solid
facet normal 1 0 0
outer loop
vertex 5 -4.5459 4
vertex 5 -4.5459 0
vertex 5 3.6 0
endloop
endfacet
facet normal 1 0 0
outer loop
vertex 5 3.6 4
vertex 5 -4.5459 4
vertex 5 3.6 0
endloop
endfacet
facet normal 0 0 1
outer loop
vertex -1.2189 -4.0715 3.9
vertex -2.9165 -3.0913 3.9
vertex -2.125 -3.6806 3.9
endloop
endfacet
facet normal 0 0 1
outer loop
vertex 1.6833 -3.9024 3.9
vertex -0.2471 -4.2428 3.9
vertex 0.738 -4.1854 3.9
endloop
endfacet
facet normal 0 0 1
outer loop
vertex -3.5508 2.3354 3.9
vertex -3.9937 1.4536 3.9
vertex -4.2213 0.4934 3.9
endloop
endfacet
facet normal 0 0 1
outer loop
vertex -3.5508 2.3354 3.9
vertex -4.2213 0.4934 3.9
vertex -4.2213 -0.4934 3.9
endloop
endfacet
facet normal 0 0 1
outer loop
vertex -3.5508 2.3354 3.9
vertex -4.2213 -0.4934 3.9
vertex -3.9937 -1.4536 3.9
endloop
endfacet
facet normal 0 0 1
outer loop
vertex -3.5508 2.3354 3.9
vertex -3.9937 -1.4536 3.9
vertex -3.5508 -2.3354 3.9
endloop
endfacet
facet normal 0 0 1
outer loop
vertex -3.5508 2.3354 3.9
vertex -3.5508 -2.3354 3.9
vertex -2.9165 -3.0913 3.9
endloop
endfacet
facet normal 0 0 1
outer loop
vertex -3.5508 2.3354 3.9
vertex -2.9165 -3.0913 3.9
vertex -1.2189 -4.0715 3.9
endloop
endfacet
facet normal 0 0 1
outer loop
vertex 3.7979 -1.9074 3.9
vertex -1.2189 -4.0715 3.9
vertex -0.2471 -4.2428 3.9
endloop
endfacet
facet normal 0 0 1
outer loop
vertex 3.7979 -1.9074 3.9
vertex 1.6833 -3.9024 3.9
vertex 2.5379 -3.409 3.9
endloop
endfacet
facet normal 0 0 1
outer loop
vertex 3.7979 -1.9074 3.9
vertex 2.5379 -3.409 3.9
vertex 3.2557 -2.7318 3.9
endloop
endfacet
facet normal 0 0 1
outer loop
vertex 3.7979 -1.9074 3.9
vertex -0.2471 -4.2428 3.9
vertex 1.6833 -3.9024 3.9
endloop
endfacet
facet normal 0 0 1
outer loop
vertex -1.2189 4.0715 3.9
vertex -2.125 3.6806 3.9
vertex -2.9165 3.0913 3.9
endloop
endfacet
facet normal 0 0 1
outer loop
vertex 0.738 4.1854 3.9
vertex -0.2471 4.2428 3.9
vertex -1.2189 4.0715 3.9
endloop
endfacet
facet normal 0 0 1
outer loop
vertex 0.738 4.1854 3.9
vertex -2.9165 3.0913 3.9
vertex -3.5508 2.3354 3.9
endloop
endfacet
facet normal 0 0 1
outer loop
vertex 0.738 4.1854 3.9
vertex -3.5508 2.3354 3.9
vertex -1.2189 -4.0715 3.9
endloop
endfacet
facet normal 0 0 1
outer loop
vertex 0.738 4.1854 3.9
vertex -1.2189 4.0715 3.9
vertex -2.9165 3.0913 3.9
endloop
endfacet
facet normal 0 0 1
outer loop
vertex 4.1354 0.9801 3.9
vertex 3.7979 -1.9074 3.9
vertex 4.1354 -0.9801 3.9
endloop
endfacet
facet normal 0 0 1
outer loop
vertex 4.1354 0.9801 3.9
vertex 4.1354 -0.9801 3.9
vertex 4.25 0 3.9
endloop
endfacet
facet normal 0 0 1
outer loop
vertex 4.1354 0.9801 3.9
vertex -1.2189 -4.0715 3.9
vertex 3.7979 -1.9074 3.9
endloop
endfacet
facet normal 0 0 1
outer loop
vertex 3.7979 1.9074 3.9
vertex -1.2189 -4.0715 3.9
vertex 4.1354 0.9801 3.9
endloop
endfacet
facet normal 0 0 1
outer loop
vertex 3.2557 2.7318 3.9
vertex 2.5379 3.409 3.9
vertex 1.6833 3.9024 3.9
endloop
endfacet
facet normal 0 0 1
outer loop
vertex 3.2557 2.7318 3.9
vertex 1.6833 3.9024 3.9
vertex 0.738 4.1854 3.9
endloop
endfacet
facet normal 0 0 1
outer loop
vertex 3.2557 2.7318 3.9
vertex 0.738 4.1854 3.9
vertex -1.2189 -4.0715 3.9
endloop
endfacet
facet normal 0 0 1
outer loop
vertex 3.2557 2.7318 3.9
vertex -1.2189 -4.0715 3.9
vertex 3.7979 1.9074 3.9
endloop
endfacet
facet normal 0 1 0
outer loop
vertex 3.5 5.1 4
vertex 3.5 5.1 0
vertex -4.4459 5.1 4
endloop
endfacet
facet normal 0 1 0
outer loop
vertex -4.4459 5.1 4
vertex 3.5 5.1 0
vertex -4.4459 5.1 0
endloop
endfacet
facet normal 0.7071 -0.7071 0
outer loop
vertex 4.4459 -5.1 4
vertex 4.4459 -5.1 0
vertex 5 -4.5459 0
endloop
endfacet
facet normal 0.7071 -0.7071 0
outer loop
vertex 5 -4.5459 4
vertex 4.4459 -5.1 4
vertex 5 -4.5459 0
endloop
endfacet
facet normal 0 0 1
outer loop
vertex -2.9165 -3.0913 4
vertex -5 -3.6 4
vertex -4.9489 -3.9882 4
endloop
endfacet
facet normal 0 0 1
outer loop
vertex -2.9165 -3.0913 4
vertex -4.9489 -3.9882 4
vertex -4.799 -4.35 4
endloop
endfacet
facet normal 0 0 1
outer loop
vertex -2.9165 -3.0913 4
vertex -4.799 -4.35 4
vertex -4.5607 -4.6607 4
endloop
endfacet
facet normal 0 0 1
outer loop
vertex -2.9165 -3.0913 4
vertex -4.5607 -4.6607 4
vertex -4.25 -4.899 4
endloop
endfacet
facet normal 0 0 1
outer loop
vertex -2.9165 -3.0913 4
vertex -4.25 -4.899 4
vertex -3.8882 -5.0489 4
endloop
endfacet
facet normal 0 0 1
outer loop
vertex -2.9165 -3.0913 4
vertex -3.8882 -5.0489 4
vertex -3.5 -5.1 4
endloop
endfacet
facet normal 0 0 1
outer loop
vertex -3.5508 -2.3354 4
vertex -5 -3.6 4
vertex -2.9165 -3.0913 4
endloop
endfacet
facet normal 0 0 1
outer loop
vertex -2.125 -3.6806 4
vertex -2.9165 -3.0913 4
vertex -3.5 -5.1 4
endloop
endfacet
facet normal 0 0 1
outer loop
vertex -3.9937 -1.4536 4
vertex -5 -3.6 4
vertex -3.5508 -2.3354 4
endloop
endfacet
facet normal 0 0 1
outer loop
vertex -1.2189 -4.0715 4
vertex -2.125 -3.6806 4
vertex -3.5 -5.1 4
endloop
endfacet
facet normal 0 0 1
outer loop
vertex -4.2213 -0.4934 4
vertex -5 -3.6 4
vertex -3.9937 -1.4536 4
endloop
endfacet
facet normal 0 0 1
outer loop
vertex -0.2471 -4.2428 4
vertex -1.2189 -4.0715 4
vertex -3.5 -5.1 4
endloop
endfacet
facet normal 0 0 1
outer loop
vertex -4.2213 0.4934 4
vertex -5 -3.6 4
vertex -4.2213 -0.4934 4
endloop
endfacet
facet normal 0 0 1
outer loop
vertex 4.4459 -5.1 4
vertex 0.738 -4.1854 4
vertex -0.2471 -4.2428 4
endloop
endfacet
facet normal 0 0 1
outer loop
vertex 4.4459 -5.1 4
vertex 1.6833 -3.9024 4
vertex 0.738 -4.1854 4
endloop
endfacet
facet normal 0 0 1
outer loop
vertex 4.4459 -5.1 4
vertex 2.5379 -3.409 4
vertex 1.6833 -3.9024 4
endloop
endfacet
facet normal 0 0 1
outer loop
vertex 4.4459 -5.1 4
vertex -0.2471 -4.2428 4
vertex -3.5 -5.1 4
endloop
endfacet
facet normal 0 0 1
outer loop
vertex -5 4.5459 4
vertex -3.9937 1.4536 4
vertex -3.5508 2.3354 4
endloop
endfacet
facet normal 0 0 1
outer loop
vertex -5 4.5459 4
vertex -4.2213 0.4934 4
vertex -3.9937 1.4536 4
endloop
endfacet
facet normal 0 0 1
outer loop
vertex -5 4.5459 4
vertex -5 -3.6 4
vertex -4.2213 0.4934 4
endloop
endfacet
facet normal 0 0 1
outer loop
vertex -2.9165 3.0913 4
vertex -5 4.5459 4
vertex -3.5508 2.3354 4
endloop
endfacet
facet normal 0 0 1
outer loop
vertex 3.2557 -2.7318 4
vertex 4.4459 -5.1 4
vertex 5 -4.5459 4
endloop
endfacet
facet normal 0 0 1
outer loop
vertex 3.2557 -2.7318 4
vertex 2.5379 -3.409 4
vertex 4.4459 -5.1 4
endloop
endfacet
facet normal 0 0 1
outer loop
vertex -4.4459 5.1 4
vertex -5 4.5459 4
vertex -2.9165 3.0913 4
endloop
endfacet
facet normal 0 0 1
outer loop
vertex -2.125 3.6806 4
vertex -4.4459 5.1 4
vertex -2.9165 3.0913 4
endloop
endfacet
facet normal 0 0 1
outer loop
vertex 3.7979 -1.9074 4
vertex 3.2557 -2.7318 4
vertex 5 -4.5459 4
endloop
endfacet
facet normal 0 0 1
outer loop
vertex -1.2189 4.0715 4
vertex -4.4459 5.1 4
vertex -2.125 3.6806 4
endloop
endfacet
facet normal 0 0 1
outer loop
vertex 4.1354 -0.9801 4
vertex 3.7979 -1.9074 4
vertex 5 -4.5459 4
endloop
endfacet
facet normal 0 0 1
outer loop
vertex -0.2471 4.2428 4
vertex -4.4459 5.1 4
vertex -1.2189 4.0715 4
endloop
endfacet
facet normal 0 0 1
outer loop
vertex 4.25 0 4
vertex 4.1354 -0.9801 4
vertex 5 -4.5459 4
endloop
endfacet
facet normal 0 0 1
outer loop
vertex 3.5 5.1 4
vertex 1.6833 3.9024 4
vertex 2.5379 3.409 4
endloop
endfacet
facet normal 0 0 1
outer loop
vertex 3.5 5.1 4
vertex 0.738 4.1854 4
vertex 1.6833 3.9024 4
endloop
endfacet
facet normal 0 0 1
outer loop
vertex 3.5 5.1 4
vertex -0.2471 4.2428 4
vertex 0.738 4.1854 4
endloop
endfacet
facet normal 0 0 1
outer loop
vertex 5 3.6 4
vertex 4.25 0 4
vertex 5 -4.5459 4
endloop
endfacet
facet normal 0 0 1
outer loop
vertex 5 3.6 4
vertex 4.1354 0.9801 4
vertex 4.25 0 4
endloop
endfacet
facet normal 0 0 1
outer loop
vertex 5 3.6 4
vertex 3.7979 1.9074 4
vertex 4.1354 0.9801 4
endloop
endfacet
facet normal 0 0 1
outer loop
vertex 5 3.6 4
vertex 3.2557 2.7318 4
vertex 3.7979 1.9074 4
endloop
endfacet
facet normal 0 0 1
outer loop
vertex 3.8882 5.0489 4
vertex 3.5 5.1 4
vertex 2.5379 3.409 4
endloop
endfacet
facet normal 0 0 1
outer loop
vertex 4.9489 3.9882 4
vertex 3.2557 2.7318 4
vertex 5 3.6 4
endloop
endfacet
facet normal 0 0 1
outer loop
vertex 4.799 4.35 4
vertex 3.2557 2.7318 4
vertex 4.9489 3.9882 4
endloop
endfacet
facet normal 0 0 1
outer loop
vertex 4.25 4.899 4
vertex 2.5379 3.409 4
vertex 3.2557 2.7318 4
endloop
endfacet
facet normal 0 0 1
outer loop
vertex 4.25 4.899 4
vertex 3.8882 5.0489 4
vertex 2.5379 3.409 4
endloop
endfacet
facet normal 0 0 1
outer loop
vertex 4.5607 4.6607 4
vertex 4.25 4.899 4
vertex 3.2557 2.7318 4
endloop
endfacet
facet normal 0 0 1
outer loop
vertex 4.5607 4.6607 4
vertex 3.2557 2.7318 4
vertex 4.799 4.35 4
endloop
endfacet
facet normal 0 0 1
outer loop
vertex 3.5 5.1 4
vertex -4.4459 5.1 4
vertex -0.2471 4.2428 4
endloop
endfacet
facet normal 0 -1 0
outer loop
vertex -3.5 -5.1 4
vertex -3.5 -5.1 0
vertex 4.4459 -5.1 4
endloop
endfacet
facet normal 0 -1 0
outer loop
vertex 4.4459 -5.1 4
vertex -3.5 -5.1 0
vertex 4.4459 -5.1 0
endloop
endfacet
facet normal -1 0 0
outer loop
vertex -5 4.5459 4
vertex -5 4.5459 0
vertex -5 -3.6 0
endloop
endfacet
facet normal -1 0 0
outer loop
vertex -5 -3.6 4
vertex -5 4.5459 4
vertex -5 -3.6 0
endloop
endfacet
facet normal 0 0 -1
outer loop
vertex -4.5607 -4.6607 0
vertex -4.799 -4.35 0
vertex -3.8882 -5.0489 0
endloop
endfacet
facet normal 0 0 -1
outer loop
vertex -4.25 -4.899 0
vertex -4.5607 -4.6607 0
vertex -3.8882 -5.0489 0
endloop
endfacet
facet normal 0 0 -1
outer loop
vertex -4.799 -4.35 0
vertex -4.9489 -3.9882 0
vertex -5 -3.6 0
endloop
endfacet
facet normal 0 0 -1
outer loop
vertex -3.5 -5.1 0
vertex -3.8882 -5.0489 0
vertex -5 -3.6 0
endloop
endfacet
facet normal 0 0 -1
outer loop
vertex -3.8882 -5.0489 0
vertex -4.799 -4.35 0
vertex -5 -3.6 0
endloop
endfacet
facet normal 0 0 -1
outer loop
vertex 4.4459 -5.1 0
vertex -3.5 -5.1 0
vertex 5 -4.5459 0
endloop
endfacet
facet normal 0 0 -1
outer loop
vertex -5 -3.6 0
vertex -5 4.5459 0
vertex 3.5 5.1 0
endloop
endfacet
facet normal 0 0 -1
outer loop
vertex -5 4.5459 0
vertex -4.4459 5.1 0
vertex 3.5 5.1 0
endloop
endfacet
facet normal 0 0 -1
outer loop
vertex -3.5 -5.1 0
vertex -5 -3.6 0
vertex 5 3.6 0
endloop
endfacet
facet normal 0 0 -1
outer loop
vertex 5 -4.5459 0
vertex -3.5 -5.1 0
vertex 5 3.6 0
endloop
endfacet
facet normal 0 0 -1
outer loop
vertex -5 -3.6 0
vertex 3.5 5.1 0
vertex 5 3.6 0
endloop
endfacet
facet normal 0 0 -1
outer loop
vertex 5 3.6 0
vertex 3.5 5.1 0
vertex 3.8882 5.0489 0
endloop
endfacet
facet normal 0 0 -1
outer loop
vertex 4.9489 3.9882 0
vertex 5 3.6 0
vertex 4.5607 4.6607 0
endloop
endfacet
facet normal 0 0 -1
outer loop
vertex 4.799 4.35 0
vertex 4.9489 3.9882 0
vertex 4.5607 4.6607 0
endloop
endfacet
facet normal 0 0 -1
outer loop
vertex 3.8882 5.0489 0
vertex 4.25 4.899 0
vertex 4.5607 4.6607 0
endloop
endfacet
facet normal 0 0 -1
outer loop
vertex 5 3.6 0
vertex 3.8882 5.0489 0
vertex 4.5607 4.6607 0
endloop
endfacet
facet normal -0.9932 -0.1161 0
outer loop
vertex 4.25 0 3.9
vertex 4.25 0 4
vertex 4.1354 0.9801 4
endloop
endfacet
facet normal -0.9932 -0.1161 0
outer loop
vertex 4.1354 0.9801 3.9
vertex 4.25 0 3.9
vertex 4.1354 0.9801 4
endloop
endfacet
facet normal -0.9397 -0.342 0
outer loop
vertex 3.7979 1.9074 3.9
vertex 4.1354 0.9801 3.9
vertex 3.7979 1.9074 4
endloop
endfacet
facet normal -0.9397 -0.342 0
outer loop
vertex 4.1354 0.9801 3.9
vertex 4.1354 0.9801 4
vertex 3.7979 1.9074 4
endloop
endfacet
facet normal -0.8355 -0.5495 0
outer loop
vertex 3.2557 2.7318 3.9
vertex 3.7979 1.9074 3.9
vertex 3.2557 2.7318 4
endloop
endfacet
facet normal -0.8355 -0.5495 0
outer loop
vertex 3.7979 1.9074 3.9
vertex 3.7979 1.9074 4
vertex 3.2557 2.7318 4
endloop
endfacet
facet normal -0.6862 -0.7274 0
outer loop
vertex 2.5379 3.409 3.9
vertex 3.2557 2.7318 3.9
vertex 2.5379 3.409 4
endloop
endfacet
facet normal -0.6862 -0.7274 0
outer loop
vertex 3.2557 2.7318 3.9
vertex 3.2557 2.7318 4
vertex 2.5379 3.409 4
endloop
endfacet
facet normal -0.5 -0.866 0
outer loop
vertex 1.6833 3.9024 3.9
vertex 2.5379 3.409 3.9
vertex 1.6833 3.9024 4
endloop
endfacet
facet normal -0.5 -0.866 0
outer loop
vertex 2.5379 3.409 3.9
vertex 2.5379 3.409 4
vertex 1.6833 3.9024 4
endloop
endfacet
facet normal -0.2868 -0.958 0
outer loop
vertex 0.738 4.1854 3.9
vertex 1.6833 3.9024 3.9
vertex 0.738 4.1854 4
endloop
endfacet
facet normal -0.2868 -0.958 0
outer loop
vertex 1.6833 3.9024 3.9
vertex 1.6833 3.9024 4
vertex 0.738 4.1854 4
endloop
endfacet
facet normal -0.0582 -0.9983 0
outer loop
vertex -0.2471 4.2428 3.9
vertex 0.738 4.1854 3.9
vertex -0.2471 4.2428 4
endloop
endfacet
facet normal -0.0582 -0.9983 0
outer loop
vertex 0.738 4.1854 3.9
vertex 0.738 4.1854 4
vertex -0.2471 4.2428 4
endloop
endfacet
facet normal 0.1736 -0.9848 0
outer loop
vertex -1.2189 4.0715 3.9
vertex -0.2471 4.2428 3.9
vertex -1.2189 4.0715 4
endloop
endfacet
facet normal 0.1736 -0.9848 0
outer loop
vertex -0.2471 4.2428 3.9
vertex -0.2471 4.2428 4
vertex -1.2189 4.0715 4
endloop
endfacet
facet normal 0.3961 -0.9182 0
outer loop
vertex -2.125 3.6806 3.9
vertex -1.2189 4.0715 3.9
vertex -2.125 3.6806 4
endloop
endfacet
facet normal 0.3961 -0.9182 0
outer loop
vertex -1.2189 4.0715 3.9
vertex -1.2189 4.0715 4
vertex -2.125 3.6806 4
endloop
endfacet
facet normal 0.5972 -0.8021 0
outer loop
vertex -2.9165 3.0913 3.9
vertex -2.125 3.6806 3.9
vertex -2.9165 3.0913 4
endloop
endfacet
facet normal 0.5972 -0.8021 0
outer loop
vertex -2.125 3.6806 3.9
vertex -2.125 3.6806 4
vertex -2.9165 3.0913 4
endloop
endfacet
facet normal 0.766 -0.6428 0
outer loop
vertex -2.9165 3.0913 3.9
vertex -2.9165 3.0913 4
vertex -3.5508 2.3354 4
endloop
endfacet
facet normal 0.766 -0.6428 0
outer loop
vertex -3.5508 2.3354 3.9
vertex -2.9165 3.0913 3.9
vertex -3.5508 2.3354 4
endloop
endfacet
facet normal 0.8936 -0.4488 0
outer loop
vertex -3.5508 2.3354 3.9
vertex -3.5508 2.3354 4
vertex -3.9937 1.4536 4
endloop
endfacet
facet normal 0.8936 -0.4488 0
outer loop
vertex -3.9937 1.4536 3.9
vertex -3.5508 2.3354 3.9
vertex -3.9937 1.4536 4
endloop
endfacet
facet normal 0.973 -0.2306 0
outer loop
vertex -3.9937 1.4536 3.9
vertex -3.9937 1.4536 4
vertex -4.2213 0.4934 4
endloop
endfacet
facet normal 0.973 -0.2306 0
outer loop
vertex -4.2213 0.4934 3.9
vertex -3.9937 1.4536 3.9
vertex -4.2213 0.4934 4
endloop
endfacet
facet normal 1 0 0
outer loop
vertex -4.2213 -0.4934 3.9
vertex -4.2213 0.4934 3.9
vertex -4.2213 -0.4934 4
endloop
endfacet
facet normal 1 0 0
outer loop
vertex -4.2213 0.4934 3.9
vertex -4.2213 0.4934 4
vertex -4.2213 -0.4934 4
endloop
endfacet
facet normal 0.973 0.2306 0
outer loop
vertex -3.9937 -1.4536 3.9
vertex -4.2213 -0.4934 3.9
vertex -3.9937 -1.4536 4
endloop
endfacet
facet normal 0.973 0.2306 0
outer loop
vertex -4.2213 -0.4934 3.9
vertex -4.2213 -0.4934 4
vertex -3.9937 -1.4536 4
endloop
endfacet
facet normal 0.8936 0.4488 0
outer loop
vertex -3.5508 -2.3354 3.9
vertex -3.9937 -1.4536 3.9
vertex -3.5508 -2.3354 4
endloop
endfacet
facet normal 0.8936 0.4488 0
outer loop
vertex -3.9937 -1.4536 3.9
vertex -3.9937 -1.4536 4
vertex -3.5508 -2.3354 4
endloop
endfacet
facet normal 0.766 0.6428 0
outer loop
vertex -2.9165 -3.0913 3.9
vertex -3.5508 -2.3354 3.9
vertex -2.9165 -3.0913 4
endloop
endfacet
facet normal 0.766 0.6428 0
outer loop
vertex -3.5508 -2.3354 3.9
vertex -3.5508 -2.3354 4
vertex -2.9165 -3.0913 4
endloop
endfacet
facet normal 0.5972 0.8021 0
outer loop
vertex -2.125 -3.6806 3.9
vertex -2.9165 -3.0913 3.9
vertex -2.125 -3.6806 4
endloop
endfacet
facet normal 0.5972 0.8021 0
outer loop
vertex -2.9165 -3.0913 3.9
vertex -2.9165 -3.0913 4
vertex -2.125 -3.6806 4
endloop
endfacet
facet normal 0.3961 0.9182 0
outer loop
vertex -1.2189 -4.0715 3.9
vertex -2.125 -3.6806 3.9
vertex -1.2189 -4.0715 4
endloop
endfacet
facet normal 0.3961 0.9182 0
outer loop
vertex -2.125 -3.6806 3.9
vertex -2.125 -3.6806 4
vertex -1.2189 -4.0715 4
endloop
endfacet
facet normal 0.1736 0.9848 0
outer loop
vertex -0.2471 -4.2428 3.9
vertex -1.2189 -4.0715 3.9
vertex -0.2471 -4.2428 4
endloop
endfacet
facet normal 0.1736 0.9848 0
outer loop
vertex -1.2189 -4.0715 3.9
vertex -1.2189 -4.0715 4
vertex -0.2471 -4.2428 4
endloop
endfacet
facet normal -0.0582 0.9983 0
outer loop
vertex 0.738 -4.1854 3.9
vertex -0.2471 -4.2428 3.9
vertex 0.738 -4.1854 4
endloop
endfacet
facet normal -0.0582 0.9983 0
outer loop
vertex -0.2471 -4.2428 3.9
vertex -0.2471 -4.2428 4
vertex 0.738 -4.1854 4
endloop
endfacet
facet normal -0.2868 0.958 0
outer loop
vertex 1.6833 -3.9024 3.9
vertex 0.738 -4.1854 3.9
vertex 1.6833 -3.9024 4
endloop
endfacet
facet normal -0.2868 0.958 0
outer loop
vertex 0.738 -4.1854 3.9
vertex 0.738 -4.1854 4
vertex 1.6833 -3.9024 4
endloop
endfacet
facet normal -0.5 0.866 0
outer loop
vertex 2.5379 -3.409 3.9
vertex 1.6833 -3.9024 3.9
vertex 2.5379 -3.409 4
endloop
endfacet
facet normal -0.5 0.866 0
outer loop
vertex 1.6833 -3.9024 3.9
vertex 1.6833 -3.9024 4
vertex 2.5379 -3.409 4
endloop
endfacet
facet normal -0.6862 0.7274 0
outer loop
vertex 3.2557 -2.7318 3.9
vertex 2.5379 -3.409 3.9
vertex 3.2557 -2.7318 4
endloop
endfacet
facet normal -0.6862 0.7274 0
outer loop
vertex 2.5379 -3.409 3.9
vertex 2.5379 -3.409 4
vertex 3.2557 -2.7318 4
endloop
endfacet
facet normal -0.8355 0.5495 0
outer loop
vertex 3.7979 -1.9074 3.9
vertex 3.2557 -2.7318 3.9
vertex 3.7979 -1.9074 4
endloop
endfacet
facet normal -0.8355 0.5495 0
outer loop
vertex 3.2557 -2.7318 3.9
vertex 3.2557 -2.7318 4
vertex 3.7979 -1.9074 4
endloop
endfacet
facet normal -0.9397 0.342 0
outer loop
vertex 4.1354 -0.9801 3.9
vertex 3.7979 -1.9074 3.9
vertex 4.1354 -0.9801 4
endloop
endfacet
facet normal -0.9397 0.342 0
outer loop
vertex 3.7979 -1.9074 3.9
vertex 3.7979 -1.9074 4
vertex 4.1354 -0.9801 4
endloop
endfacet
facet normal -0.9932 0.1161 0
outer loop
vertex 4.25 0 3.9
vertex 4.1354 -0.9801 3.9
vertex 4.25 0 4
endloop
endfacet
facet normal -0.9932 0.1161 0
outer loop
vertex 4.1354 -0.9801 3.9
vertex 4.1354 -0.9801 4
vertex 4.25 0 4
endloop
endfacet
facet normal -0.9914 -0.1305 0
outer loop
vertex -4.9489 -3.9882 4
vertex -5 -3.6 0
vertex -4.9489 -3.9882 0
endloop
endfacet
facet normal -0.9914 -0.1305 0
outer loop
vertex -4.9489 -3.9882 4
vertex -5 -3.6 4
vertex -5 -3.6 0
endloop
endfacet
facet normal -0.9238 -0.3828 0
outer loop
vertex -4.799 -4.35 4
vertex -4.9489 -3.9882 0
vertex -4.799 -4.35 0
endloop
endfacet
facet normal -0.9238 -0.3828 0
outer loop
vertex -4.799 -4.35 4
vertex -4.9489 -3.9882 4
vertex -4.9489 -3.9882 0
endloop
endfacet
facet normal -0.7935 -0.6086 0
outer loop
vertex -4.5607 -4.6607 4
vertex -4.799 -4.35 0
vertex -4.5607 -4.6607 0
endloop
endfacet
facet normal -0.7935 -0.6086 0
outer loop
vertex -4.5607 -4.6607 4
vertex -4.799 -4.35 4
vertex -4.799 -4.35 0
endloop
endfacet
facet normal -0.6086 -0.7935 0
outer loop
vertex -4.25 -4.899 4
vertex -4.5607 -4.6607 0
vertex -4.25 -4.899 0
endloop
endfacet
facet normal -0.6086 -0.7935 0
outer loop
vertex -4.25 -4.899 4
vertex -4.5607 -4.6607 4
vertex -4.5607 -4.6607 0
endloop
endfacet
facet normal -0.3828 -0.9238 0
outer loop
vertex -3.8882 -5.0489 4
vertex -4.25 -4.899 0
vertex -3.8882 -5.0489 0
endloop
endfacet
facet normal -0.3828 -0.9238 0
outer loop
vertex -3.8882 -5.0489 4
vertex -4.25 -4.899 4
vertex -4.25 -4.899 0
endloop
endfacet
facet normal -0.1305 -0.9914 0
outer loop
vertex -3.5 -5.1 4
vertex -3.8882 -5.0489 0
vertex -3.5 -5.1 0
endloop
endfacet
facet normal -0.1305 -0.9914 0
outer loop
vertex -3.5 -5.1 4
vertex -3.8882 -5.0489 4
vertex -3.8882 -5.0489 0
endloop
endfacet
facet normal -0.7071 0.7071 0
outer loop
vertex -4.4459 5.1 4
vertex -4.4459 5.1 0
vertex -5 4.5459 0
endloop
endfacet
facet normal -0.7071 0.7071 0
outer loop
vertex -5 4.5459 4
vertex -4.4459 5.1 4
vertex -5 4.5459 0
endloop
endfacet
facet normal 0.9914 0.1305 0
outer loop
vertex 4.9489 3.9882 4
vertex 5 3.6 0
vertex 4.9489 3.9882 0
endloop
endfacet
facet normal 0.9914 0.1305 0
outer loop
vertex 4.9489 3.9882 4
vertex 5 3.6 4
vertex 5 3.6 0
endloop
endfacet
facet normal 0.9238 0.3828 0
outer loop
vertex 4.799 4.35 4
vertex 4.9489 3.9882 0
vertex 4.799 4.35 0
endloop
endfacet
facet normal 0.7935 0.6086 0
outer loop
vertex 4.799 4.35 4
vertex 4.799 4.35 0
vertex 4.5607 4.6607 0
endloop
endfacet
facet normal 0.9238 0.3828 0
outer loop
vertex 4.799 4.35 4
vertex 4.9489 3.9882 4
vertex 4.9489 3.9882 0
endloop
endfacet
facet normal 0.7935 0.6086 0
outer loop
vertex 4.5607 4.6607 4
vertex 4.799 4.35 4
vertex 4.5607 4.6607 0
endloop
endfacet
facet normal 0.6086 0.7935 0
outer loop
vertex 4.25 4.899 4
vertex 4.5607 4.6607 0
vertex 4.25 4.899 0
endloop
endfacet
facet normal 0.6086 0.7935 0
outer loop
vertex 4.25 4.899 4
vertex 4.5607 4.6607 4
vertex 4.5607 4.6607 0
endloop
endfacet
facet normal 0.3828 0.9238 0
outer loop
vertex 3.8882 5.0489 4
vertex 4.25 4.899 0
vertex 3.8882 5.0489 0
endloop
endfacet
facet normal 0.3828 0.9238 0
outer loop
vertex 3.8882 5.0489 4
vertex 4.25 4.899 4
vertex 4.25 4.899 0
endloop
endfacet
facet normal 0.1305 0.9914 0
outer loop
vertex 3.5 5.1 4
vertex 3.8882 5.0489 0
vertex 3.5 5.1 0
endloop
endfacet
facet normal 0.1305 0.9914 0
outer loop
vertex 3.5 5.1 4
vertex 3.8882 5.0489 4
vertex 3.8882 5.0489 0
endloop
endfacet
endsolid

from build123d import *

# Parameters (mm, degrees)
EXTRUDE_1_DEPTH     = 4
FILLET_1_R          = 1.5
SKETCH_2_R          = 4.25
CUT_EXTRUDE_1_DEPTH = 0.1


with BuildPart() as part:
    # Эскиз1 → Бобышка-Вытянуть1 (new body)
    with BuildSketch(Plane.XY):
        Polygon((-5, 4.545941546), (-5, -5.1), (4.445941546, -5.1), (5, -4.545941546), (5, 5.1), (-4.445941546, 5.1), align=None)
    extrude(amount=EXTRUDE_1_DEPTH)

    # Скругление1
    fillet_1_edges = [part.edges().sort_by_distance(p)[0] for p in [
        (5, 5.1, 2),
        (-5, -5.1, 2),
    ]]
    fillet(fillet_1_edges, radius=FILLET_1_R)

    # Эскиз2 → Вырез-Вытянуть1 (cut)
    with BuildSketch(Plane.XY.offset(4)):
        Circle(SKETCH_2_R)
    extrude(amount=-CUT_EXTRUDE_1_DEPTH, mode=Mode.SUBTRACT)


solid = part.part
